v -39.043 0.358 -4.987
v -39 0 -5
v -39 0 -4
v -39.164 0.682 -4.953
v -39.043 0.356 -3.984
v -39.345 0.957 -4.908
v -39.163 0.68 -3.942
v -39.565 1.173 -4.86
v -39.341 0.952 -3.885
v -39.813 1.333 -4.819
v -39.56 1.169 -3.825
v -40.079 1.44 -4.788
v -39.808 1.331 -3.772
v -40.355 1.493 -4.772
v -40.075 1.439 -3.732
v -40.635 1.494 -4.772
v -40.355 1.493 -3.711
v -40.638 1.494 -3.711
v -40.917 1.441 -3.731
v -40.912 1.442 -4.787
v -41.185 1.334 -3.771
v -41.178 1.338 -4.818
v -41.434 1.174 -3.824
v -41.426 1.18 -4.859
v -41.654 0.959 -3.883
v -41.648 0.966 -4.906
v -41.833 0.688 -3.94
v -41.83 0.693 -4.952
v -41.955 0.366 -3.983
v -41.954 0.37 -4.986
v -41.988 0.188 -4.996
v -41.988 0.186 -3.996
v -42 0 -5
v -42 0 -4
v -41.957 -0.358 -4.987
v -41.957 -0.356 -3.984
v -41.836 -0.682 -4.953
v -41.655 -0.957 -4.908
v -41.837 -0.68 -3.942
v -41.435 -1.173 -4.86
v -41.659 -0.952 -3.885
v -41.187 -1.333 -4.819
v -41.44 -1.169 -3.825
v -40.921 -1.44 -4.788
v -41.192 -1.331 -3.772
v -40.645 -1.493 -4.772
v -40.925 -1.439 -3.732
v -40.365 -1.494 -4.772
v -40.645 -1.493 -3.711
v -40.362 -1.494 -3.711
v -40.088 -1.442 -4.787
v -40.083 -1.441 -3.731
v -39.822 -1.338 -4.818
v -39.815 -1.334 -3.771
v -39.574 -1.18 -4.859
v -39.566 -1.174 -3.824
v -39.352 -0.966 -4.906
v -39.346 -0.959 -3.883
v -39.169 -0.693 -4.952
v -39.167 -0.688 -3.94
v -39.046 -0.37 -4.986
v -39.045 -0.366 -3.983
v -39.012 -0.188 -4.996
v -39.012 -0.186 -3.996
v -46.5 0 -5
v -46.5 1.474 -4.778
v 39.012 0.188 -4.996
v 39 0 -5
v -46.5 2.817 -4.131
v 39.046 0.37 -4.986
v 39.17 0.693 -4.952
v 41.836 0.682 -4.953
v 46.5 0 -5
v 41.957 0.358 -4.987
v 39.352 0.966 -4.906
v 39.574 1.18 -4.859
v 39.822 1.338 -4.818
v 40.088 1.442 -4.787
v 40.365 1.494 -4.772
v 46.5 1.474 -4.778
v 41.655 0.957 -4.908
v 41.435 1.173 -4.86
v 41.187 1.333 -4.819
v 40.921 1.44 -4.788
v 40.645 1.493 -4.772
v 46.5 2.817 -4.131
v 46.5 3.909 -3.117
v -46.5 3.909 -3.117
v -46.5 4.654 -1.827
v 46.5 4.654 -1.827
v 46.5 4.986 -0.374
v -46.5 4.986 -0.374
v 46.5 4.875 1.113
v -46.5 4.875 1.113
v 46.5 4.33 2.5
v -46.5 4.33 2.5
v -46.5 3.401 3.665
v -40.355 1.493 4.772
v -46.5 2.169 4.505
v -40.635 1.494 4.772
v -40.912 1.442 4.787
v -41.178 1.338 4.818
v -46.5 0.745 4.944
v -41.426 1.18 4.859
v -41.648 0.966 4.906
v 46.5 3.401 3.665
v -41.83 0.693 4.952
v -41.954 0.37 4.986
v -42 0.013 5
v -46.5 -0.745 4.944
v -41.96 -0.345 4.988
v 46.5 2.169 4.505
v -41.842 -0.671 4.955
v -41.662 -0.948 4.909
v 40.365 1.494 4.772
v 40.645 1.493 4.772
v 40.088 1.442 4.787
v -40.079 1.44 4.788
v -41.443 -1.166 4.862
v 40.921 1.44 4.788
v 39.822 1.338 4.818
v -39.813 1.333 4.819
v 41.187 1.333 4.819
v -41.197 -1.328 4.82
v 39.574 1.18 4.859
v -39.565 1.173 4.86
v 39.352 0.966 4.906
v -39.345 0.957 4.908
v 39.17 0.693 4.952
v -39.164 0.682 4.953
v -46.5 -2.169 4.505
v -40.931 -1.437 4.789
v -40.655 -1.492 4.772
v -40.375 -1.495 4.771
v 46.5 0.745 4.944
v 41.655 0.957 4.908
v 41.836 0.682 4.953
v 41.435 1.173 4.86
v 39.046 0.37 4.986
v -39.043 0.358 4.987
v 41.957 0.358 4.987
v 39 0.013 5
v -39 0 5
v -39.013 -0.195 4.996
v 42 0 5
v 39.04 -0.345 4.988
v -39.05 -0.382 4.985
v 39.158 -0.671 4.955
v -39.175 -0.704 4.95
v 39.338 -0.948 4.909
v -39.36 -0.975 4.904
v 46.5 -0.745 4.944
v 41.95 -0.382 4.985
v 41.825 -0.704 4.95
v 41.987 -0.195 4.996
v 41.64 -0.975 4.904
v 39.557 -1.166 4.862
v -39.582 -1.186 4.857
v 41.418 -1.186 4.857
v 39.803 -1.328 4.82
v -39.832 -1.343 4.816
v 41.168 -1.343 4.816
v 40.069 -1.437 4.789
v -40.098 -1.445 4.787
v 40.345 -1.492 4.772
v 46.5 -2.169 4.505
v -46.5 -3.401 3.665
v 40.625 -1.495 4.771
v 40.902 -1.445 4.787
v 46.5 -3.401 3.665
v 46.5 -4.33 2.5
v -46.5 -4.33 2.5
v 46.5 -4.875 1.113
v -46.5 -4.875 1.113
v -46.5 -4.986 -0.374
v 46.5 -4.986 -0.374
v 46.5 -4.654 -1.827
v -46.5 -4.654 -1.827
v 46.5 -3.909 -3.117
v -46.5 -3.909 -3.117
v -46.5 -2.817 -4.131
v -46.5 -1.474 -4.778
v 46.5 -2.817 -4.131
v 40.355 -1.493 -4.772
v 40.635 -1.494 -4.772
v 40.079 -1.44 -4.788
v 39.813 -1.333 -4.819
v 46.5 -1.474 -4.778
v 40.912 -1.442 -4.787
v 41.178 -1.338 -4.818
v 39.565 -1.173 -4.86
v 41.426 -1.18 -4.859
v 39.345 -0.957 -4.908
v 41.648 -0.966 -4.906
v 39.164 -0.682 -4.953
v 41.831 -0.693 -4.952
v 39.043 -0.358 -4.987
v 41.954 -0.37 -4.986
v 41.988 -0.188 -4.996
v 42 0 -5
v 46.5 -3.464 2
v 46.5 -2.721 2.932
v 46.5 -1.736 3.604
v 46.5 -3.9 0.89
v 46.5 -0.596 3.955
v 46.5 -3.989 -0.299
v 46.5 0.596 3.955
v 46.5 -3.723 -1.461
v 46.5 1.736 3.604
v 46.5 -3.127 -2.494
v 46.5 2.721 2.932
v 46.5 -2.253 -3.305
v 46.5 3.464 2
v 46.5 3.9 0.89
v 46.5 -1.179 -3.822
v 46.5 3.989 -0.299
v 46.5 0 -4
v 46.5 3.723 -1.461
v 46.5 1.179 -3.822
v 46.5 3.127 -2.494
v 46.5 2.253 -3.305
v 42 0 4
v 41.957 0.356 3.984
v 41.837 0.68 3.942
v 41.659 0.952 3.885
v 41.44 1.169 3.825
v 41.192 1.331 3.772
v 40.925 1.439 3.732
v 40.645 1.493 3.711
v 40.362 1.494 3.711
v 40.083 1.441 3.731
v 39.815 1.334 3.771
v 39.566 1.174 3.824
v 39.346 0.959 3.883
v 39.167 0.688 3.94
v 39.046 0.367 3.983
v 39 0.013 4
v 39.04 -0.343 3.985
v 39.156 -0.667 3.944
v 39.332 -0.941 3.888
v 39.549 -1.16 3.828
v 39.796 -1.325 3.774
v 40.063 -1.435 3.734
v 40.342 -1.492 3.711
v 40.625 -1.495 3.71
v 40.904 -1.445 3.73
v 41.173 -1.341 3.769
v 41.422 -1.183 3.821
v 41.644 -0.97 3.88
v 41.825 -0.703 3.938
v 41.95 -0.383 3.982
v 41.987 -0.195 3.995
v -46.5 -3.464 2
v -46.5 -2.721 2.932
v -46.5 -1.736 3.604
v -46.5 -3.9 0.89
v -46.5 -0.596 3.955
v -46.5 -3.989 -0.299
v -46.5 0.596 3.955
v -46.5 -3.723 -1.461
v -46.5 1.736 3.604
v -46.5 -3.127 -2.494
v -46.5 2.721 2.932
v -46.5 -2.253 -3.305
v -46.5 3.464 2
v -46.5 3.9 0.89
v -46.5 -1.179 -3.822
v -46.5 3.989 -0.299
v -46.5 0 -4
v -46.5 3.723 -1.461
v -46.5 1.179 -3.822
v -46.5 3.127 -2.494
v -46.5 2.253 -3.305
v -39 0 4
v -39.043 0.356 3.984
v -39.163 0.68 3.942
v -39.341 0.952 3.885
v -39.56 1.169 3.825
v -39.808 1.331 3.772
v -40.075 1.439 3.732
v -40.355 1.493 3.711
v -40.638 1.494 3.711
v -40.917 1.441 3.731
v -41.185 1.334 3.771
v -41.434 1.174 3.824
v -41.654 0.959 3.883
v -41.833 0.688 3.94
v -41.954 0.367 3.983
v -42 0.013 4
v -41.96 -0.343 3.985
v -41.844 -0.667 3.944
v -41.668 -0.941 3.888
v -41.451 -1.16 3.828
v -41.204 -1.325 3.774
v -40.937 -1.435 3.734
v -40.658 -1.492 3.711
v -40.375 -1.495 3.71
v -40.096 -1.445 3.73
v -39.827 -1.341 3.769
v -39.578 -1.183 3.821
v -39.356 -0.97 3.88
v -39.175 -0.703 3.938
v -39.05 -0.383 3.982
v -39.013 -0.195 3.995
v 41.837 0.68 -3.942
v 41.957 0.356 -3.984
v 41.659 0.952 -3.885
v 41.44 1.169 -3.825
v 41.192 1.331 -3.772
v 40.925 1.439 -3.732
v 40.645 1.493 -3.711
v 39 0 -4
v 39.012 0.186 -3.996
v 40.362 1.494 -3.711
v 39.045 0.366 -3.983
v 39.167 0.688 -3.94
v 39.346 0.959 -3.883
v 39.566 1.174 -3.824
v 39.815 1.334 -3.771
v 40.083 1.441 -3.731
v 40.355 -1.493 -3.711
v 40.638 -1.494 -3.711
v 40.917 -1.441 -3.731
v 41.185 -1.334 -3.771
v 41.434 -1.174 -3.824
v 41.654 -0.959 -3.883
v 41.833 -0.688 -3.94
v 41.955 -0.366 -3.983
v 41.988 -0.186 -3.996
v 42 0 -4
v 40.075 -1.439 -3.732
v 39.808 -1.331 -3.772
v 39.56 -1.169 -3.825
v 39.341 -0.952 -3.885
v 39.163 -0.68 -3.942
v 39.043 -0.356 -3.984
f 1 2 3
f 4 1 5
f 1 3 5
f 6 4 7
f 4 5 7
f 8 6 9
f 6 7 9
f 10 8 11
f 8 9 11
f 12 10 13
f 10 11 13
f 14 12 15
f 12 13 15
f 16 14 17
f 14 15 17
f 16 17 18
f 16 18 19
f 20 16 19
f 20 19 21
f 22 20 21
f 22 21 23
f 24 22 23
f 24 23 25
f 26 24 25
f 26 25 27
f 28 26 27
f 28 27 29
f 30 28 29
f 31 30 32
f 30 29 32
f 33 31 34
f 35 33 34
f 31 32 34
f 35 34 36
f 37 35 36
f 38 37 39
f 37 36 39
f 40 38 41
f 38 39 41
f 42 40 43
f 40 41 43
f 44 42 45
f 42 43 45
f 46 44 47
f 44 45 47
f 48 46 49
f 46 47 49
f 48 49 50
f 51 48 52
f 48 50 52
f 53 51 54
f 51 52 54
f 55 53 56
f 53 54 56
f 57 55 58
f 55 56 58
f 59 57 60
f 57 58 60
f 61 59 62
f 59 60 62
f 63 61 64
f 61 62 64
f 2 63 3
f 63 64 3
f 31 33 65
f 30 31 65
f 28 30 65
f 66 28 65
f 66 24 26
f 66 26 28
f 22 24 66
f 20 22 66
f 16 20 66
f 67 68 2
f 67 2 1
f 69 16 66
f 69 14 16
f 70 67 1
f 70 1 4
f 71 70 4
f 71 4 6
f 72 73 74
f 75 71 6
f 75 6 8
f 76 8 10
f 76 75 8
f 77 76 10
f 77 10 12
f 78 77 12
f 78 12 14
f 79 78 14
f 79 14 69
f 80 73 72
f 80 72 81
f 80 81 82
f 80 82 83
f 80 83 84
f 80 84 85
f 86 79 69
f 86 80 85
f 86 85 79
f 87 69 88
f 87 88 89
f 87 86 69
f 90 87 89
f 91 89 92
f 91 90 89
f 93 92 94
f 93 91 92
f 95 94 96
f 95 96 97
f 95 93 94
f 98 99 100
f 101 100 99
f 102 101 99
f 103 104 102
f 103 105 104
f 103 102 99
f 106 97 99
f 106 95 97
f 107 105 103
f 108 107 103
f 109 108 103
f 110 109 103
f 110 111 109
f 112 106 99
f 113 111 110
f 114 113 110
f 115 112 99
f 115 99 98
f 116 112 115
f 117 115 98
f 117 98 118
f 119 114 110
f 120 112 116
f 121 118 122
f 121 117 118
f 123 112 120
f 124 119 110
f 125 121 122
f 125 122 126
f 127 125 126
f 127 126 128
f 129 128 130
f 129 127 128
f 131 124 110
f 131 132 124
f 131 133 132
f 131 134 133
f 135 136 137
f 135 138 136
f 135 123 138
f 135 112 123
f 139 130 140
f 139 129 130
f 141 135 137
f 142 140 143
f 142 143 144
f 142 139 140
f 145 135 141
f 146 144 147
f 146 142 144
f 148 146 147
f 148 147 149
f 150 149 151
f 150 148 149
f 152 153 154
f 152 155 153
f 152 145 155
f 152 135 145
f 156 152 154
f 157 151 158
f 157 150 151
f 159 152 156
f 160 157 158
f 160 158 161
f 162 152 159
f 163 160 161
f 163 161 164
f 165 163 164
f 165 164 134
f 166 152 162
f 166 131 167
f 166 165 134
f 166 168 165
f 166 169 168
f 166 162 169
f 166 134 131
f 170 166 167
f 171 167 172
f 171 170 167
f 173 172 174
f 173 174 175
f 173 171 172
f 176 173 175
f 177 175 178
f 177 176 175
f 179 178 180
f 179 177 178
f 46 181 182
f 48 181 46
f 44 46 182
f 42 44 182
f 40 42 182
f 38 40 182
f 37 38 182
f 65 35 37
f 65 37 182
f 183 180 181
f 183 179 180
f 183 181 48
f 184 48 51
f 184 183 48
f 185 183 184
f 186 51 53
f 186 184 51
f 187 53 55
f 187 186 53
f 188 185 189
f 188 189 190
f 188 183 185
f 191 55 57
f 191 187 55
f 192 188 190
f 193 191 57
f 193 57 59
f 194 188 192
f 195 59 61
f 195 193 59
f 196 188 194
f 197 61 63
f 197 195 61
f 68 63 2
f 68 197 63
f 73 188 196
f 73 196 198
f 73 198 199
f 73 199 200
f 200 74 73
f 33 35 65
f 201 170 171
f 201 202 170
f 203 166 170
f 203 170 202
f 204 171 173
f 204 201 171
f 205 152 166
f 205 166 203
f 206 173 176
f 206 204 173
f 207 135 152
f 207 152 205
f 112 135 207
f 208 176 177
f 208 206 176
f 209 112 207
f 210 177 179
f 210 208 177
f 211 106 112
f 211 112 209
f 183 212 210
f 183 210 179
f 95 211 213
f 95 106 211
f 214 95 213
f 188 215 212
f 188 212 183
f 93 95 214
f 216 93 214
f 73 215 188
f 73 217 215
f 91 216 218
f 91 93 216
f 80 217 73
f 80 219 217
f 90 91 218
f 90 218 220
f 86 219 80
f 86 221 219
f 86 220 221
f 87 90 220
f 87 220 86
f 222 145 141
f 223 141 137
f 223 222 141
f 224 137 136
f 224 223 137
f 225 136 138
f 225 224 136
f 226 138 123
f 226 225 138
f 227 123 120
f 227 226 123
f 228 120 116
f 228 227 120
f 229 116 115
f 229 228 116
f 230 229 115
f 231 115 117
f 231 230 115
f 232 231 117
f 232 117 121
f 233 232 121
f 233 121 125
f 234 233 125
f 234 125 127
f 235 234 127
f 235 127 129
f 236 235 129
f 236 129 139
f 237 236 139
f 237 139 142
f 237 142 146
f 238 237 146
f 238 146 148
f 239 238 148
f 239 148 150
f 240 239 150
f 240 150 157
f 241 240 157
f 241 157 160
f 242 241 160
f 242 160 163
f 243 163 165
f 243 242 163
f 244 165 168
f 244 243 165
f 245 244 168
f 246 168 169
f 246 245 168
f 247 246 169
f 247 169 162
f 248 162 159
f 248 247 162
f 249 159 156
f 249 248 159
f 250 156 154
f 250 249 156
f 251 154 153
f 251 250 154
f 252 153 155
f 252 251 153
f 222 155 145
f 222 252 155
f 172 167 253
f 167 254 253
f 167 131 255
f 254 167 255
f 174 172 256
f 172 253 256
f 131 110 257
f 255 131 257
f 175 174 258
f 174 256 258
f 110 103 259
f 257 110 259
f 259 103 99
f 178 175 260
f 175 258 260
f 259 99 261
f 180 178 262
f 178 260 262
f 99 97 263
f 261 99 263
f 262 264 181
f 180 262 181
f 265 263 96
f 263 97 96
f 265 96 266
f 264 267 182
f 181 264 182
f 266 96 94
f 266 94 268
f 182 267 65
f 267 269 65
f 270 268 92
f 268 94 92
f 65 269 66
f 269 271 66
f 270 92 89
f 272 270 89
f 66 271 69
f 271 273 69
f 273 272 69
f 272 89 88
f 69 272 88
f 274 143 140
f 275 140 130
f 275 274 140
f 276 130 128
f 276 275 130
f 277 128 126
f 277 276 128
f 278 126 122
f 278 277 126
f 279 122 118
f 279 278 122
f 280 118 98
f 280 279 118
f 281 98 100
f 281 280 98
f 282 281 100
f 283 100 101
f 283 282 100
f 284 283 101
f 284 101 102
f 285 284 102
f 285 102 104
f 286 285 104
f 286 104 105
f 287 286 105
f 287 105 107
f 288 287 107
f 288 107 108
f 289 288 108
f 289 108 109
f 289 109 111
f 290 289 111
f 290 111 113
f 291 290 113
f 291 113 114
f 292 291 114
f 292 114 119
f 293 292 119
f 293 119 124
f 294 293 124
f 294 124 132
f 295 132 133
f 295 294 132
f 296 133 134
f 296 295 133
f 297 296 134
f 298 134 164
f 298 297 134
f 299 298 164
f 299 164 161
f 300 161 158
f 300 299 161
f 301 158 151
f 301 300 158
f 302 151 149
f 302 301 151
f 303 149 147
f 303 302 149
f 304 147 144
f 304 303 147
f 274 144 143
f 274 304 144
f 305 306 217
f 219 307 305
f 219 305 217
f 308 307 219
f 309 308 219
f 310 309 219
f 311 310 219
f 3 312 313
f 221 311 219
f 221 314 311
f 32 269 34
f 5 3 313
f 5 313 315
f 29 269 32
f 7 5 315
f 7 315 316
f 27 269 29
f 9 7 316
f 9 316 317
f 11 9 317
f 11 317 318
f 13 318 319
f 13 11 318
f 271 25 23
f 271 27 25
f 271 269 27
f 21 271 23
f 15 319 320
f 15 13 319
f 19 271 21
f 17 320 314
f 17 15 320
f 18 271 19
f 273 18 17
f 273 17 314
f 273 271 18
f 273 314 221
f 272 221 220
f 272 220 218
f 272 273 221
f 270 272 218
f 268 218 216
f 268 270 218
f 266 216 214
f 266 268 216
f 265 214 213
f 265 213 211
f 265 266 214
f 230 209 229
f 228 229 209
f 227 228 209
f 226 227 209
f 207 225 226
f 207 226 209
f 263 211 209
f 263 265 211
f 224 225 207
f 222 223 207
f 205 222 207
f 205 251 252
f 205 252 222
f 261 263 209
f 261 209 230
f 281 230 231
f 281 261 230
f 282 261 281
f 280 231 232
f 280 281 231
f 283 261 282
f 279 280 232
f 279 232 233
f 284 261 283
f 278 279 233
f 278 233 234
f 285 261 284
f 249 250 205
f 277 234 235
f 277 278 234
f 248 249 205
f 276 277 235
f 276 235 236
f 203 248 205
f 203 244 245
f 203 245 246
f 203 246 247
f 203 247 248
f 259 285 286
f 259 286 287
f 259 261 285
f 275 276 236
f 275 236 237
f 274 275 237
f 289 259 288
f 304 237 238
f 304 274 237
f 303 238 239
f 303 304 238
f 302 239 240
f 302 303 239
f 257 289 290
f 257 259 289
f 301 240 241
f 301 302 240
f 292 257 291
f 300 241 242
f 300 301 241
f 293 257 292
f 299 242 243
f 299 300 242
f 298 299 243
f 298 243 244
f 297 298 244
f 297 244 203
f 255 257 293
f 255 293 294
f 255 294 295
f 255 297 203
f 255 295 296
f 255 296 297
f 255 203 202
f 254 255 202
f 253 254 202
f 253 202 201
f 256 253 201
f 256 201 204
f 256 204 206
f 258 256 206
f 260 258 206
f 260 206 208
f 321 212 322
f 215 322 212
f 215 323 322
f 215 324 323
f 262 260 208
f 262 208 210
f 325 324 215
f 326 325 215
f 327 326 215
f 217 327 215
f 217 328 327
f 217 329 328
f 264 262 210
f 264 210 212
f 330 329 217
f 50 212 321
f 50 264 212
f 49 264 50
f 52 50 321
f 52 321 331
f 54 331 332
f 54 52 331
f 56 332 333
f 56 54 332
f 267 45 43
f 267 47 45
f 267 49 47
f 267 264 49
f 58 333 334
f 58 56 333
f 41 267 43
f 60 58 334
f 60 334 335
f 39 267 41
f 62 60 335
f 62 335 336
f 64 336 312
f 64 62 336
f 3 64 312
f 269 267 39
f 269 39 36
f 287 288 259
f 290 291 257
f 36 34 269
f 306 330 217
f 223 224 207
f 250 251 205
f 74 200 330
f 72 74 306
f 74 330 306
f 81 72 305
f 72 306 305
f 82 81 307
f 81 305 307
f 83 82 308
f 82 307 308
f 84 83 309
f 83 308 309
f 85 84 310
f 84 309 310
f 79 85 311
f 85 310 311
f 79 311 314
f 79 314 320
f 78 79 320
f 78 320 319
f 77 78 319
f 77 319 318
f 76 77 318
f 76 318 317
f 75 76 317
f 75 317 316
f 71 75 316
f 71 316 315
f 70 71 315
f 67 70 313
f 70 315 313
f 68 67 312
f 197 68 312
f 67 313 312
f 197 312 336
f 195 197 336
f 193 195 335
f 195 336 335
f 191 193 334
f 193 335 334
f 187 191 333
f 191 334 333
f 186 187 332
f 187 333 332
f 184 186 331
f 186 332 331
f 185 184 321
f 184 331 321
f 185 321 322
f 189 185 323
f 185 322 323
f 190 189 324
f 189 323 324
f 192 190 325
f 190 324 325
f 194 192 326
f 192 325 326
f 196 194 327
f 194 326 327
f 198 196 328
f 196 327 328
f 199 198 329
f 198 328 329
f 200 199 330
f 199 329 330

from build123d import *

# Parameters (mm, degrees)
SKETCH_1_R               = 5
SKETCH_1_R_2             = 4
EXTRUDE_1_DEPTH          = 46.5
SKETCH_2_R               = 1.5
CUT_EXTRUDE_1_DEPTH      = 6
CUT_EXTRUDE_1_DEPTH_BACK = 6


with BuildPart() as part:
    # 草图1 → 凸台-拉伸1 (new body, symmetric)
    with BuildSketch(Plane(origin=(0, 0, 0), x_dir=(0, 0, -1), z_dir=(1, 0, 0))):
        Circle(SKETCH_1_R)
        Circle(SKETCH_1_R_2, mode=Mode.SUBTRACT)
    extrude(amount=EXTRUDE_1_DEPTH, both=True)

    # 草图2 → 切除-拉伸1 (cut, two sides)
    with BuildSketch(Plane.XY) as cut_extrude_1_sk:
        with Locations((40.5, 0)):
            Circle(SKETCH_2_R)
        with Locations((-40.5, 0)):
            Circle(SKETCH_2_R)
    extrude(amount=CUT_EXTRUDE_1_DEPTH, mode=Mode.SUBTRACT)
    extrude(cut_extrude_1_sk.sketch, amount=-CUT_EXTRUDE_1_DEPTH_BACK, mode=Mode.SUBTRACT)


solid = part.part
